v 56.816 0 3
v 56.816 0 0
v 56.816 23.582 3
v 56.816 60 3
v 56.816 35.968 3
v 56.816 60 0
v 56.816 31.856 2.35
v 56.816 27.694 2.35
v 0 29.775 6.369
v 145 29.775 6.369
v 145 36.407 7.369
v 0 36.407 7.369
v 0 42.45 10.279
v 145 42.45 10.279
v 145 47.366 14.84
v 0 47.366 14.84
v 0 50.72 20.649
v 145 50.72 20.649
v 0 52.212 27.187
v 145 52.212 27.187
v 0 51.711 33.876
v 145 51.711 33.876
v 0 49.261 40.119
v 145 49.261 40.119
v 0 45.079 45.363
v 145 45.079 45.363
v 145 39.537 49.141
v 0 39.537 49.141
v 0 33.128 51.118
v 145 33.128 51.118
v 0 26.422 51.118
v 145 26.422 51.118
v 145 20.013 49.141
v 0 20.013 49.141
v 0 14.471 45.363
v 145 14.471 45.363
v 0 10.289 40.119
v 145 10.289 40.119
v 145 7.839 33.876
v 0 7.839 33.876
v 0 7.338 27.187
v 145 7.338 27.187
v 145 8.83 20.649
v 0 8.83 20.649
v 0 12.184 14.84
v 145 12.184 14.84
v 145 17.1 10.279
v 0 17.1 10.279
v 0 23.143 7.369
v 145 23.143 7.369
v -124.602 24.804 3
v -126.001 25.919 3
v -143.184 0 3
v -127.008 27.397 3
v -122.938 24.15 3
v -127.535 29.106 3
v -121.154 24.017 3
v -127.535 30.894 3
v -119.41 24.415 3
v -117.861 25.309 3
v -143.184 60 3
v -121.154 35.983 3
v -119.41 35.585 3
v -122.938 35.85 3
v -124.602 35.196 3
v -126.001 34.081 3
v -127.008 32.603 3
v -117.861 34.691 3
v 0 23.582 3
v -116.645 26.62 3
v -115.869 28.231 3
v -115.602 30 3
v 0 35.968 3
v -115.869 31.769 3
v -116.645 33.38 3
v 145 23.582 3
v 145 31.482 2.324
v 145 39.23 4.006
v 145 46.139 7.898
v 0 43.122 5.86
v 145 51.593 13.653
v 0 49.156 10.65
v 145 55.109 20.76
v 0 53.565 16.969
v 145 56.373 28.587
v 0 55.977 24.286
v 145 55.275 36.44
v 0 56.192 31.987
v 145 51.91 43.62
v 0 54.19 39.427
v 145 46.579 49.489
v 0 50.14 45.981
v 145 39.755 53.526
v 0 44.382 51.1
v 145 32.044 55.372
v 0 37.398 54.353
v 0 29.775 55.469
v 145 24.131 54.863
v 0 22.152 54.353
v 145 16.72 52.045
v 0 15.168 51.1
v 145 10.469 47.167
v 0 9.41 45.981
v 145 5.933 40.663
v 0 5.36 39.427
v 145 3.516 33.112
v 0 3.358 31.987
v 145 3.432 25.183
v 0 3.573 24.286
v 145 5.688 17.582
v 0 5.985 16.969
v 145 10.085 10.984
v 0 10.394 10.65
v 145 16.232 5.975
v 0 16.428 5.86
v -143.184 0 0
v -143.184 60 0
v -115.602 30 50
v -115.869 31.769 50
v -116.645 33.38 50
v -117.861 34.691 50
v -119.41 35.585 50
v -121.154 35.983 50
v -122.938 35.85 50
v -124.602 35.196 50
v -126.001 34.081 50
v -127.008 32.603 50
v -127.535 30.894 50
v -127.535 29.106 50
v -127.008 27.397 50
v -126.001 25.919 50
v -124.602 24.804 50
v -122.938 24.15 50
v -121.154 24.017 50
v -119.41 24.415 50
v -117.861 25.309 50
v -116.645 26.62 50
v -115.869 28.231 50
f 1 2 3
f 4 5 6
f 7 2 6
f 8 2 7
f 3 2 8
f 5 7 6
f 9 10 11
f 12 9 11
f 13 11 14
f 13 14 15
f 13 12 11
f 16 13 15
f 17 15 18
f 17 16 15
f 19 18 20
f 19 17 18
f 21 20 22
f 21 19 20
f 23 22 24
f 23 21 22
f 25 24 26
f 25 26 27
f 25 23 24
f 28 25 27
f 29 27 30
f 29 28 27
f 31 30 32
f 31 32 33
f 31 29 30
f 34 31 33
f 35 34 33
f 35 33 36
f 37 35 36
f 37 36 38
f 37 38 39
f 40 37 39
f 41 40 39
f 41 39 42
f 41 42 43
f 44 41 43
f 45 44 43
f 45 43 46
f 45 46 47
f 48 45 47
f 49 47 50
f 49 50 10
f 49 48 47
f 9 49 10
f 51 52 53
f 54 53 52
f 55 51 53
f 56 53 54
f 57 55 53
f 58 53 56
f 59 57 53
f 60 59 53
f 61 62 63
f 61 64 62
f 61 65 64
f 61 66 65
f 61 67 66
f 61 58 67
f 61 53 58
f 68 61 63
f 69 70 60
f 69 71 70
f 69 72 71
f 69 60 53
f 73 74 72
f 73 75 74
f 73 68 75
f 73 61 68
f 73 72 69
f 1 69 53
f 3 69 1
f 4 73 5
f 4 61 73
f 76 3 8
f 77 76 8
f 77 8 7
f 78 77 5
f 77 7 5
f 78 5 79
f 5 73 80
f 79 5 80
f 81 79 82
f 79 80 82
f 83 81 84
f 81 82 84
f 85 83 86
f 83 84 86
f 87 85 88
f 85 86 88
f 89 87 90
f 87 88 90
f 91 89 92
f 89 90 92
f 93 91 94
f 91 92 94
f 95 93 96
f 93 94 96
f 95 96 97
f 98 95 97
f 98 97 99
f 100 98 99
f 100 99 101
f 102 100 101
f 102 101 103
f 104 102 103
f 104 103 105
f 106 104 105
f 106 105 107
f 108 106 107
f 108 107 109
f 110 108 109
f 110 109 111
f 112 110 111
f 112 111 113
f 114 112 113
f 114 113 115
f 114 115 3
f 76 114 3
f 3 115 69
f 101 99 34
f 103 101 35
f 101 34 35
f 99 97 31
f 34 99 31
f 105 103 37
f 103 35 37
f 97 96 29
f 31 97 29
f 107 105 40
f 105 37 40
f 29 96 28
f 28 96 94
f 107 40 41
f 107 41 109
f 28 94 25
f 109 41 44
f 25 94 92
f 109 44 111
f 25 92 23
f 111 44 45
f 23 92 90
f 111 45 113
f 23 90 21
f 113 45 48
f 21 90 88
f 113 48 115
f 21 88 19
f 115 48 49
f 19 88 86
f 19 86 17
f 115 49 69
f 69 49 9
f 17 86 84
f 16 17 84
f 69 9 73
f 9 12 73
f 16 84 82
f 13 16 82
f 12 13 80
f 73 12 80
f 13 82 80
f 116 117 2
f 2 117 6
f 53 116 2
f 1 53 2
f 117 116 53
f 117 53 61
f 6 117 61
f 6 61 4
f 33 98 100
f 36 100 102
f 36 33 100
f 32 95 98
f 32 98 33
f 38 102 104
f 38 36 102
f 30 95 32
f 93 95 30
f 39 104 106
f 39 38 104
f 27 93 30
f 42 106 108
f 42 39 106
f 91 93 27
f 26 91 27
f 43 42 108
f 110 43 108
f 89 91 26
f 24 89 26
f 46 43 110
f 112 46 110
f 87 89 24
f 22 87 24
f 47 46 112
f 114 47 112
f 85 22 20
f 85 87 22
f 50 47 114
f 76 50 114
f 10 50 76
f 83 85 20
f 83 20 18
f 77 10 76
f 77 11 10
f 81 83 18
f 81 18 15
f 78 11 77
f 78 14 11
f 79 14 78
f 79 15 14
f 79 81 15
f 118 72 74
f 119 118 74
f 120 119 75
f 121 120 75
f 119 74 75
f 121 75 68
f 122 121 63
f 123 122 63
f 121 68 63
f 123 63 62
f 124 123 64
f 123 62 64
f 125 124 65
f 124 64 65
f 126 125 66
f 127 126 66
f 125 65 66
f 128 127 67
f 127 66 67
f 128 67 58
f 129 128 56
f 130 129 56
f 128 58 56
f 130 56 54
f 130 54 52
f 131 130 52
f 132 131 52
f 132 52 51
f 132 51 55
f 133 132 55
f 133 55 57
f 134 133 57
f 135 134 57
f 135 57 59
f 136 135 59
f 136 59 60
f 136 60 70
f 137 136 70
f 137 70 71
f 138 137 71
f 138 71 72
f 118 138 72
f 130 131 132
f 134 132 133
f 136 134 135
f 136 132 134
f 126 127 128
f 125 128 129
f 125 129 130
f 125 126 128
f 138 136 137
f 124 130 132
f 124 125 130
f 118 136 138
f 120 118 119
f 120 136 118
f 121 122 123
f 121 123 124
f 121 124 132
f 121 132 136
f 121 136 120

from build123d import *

# Parameters (mm, degrees)
EXTRUDE_1_DEPTH = 3
EXTRUDE_2_DEPTH = 50
SKETCH_2_R      = 26.59997625
SKETCH_2_R_2    = 22.5
EXTRUDE_3_DEPTH = 145


with BuildPart() as part:
    # 草图1 → 凸台-拉伸1 (new body)
    with BuildSketch(Plane(origin=(-45.881001885, 0, 0), x_dir=(1, 0, 0), z_dir=(0, 0, 1))):
        Polygon((-97.302904564, 60), (-97.302904564, 30), (-97.302904564, 0), (102.697095436, 0), (102.697095436, 60), align=None)
        with BuildLine():
            ThreePointArc((-69.721397193, 30), (-75.721397193, 24), (-81.721397193, 30))
            ThreePointArc((-81.721397193, 30), (-75.721397193, 36), (-69.721397193, 30))
        make_face(mode=Mode.SUBTRACT)
    extrude(amount=EXTRUDE_1_DEPTH)

    # 草图1<3> → 凸台-拉伸2 (add)
    with BuildSketch(Plane(origin=(-45.881001885, 0, 0), x_dir=(1, 0, 0), z_dir=(0, 0, 1))):
        with BuildLine():
            ThreePointArc((-69.721397193, 30), (-75.721397193, 36), (-81.721397193, 30))
            ThreePointArc((-81.721397193, 30), (-75.721397193, 24), (-69.721397193, 30))
        make_face()
    extrude(amount=EXTRUDE_2_DEPTH)

    # 草图2 → 凸台-拉伸3 (add)
    with BuildSketch(Plane(origin=(0, 0, 2.268932334), x_dir=(0, 0, -1), z_dir=(1, 0, 0))):
        with Locations((-26.59997625, 29.77500334)):
            Circle(SKETCH_2_R)
        with Locations((-26.59997625, 29.77500334)):
            Circle(SKETCH_2_R_2, mode=Mode.SUBTRACT)
    extrude(amount=EXTRUDE_3_DEPTH)


solid = part.part
